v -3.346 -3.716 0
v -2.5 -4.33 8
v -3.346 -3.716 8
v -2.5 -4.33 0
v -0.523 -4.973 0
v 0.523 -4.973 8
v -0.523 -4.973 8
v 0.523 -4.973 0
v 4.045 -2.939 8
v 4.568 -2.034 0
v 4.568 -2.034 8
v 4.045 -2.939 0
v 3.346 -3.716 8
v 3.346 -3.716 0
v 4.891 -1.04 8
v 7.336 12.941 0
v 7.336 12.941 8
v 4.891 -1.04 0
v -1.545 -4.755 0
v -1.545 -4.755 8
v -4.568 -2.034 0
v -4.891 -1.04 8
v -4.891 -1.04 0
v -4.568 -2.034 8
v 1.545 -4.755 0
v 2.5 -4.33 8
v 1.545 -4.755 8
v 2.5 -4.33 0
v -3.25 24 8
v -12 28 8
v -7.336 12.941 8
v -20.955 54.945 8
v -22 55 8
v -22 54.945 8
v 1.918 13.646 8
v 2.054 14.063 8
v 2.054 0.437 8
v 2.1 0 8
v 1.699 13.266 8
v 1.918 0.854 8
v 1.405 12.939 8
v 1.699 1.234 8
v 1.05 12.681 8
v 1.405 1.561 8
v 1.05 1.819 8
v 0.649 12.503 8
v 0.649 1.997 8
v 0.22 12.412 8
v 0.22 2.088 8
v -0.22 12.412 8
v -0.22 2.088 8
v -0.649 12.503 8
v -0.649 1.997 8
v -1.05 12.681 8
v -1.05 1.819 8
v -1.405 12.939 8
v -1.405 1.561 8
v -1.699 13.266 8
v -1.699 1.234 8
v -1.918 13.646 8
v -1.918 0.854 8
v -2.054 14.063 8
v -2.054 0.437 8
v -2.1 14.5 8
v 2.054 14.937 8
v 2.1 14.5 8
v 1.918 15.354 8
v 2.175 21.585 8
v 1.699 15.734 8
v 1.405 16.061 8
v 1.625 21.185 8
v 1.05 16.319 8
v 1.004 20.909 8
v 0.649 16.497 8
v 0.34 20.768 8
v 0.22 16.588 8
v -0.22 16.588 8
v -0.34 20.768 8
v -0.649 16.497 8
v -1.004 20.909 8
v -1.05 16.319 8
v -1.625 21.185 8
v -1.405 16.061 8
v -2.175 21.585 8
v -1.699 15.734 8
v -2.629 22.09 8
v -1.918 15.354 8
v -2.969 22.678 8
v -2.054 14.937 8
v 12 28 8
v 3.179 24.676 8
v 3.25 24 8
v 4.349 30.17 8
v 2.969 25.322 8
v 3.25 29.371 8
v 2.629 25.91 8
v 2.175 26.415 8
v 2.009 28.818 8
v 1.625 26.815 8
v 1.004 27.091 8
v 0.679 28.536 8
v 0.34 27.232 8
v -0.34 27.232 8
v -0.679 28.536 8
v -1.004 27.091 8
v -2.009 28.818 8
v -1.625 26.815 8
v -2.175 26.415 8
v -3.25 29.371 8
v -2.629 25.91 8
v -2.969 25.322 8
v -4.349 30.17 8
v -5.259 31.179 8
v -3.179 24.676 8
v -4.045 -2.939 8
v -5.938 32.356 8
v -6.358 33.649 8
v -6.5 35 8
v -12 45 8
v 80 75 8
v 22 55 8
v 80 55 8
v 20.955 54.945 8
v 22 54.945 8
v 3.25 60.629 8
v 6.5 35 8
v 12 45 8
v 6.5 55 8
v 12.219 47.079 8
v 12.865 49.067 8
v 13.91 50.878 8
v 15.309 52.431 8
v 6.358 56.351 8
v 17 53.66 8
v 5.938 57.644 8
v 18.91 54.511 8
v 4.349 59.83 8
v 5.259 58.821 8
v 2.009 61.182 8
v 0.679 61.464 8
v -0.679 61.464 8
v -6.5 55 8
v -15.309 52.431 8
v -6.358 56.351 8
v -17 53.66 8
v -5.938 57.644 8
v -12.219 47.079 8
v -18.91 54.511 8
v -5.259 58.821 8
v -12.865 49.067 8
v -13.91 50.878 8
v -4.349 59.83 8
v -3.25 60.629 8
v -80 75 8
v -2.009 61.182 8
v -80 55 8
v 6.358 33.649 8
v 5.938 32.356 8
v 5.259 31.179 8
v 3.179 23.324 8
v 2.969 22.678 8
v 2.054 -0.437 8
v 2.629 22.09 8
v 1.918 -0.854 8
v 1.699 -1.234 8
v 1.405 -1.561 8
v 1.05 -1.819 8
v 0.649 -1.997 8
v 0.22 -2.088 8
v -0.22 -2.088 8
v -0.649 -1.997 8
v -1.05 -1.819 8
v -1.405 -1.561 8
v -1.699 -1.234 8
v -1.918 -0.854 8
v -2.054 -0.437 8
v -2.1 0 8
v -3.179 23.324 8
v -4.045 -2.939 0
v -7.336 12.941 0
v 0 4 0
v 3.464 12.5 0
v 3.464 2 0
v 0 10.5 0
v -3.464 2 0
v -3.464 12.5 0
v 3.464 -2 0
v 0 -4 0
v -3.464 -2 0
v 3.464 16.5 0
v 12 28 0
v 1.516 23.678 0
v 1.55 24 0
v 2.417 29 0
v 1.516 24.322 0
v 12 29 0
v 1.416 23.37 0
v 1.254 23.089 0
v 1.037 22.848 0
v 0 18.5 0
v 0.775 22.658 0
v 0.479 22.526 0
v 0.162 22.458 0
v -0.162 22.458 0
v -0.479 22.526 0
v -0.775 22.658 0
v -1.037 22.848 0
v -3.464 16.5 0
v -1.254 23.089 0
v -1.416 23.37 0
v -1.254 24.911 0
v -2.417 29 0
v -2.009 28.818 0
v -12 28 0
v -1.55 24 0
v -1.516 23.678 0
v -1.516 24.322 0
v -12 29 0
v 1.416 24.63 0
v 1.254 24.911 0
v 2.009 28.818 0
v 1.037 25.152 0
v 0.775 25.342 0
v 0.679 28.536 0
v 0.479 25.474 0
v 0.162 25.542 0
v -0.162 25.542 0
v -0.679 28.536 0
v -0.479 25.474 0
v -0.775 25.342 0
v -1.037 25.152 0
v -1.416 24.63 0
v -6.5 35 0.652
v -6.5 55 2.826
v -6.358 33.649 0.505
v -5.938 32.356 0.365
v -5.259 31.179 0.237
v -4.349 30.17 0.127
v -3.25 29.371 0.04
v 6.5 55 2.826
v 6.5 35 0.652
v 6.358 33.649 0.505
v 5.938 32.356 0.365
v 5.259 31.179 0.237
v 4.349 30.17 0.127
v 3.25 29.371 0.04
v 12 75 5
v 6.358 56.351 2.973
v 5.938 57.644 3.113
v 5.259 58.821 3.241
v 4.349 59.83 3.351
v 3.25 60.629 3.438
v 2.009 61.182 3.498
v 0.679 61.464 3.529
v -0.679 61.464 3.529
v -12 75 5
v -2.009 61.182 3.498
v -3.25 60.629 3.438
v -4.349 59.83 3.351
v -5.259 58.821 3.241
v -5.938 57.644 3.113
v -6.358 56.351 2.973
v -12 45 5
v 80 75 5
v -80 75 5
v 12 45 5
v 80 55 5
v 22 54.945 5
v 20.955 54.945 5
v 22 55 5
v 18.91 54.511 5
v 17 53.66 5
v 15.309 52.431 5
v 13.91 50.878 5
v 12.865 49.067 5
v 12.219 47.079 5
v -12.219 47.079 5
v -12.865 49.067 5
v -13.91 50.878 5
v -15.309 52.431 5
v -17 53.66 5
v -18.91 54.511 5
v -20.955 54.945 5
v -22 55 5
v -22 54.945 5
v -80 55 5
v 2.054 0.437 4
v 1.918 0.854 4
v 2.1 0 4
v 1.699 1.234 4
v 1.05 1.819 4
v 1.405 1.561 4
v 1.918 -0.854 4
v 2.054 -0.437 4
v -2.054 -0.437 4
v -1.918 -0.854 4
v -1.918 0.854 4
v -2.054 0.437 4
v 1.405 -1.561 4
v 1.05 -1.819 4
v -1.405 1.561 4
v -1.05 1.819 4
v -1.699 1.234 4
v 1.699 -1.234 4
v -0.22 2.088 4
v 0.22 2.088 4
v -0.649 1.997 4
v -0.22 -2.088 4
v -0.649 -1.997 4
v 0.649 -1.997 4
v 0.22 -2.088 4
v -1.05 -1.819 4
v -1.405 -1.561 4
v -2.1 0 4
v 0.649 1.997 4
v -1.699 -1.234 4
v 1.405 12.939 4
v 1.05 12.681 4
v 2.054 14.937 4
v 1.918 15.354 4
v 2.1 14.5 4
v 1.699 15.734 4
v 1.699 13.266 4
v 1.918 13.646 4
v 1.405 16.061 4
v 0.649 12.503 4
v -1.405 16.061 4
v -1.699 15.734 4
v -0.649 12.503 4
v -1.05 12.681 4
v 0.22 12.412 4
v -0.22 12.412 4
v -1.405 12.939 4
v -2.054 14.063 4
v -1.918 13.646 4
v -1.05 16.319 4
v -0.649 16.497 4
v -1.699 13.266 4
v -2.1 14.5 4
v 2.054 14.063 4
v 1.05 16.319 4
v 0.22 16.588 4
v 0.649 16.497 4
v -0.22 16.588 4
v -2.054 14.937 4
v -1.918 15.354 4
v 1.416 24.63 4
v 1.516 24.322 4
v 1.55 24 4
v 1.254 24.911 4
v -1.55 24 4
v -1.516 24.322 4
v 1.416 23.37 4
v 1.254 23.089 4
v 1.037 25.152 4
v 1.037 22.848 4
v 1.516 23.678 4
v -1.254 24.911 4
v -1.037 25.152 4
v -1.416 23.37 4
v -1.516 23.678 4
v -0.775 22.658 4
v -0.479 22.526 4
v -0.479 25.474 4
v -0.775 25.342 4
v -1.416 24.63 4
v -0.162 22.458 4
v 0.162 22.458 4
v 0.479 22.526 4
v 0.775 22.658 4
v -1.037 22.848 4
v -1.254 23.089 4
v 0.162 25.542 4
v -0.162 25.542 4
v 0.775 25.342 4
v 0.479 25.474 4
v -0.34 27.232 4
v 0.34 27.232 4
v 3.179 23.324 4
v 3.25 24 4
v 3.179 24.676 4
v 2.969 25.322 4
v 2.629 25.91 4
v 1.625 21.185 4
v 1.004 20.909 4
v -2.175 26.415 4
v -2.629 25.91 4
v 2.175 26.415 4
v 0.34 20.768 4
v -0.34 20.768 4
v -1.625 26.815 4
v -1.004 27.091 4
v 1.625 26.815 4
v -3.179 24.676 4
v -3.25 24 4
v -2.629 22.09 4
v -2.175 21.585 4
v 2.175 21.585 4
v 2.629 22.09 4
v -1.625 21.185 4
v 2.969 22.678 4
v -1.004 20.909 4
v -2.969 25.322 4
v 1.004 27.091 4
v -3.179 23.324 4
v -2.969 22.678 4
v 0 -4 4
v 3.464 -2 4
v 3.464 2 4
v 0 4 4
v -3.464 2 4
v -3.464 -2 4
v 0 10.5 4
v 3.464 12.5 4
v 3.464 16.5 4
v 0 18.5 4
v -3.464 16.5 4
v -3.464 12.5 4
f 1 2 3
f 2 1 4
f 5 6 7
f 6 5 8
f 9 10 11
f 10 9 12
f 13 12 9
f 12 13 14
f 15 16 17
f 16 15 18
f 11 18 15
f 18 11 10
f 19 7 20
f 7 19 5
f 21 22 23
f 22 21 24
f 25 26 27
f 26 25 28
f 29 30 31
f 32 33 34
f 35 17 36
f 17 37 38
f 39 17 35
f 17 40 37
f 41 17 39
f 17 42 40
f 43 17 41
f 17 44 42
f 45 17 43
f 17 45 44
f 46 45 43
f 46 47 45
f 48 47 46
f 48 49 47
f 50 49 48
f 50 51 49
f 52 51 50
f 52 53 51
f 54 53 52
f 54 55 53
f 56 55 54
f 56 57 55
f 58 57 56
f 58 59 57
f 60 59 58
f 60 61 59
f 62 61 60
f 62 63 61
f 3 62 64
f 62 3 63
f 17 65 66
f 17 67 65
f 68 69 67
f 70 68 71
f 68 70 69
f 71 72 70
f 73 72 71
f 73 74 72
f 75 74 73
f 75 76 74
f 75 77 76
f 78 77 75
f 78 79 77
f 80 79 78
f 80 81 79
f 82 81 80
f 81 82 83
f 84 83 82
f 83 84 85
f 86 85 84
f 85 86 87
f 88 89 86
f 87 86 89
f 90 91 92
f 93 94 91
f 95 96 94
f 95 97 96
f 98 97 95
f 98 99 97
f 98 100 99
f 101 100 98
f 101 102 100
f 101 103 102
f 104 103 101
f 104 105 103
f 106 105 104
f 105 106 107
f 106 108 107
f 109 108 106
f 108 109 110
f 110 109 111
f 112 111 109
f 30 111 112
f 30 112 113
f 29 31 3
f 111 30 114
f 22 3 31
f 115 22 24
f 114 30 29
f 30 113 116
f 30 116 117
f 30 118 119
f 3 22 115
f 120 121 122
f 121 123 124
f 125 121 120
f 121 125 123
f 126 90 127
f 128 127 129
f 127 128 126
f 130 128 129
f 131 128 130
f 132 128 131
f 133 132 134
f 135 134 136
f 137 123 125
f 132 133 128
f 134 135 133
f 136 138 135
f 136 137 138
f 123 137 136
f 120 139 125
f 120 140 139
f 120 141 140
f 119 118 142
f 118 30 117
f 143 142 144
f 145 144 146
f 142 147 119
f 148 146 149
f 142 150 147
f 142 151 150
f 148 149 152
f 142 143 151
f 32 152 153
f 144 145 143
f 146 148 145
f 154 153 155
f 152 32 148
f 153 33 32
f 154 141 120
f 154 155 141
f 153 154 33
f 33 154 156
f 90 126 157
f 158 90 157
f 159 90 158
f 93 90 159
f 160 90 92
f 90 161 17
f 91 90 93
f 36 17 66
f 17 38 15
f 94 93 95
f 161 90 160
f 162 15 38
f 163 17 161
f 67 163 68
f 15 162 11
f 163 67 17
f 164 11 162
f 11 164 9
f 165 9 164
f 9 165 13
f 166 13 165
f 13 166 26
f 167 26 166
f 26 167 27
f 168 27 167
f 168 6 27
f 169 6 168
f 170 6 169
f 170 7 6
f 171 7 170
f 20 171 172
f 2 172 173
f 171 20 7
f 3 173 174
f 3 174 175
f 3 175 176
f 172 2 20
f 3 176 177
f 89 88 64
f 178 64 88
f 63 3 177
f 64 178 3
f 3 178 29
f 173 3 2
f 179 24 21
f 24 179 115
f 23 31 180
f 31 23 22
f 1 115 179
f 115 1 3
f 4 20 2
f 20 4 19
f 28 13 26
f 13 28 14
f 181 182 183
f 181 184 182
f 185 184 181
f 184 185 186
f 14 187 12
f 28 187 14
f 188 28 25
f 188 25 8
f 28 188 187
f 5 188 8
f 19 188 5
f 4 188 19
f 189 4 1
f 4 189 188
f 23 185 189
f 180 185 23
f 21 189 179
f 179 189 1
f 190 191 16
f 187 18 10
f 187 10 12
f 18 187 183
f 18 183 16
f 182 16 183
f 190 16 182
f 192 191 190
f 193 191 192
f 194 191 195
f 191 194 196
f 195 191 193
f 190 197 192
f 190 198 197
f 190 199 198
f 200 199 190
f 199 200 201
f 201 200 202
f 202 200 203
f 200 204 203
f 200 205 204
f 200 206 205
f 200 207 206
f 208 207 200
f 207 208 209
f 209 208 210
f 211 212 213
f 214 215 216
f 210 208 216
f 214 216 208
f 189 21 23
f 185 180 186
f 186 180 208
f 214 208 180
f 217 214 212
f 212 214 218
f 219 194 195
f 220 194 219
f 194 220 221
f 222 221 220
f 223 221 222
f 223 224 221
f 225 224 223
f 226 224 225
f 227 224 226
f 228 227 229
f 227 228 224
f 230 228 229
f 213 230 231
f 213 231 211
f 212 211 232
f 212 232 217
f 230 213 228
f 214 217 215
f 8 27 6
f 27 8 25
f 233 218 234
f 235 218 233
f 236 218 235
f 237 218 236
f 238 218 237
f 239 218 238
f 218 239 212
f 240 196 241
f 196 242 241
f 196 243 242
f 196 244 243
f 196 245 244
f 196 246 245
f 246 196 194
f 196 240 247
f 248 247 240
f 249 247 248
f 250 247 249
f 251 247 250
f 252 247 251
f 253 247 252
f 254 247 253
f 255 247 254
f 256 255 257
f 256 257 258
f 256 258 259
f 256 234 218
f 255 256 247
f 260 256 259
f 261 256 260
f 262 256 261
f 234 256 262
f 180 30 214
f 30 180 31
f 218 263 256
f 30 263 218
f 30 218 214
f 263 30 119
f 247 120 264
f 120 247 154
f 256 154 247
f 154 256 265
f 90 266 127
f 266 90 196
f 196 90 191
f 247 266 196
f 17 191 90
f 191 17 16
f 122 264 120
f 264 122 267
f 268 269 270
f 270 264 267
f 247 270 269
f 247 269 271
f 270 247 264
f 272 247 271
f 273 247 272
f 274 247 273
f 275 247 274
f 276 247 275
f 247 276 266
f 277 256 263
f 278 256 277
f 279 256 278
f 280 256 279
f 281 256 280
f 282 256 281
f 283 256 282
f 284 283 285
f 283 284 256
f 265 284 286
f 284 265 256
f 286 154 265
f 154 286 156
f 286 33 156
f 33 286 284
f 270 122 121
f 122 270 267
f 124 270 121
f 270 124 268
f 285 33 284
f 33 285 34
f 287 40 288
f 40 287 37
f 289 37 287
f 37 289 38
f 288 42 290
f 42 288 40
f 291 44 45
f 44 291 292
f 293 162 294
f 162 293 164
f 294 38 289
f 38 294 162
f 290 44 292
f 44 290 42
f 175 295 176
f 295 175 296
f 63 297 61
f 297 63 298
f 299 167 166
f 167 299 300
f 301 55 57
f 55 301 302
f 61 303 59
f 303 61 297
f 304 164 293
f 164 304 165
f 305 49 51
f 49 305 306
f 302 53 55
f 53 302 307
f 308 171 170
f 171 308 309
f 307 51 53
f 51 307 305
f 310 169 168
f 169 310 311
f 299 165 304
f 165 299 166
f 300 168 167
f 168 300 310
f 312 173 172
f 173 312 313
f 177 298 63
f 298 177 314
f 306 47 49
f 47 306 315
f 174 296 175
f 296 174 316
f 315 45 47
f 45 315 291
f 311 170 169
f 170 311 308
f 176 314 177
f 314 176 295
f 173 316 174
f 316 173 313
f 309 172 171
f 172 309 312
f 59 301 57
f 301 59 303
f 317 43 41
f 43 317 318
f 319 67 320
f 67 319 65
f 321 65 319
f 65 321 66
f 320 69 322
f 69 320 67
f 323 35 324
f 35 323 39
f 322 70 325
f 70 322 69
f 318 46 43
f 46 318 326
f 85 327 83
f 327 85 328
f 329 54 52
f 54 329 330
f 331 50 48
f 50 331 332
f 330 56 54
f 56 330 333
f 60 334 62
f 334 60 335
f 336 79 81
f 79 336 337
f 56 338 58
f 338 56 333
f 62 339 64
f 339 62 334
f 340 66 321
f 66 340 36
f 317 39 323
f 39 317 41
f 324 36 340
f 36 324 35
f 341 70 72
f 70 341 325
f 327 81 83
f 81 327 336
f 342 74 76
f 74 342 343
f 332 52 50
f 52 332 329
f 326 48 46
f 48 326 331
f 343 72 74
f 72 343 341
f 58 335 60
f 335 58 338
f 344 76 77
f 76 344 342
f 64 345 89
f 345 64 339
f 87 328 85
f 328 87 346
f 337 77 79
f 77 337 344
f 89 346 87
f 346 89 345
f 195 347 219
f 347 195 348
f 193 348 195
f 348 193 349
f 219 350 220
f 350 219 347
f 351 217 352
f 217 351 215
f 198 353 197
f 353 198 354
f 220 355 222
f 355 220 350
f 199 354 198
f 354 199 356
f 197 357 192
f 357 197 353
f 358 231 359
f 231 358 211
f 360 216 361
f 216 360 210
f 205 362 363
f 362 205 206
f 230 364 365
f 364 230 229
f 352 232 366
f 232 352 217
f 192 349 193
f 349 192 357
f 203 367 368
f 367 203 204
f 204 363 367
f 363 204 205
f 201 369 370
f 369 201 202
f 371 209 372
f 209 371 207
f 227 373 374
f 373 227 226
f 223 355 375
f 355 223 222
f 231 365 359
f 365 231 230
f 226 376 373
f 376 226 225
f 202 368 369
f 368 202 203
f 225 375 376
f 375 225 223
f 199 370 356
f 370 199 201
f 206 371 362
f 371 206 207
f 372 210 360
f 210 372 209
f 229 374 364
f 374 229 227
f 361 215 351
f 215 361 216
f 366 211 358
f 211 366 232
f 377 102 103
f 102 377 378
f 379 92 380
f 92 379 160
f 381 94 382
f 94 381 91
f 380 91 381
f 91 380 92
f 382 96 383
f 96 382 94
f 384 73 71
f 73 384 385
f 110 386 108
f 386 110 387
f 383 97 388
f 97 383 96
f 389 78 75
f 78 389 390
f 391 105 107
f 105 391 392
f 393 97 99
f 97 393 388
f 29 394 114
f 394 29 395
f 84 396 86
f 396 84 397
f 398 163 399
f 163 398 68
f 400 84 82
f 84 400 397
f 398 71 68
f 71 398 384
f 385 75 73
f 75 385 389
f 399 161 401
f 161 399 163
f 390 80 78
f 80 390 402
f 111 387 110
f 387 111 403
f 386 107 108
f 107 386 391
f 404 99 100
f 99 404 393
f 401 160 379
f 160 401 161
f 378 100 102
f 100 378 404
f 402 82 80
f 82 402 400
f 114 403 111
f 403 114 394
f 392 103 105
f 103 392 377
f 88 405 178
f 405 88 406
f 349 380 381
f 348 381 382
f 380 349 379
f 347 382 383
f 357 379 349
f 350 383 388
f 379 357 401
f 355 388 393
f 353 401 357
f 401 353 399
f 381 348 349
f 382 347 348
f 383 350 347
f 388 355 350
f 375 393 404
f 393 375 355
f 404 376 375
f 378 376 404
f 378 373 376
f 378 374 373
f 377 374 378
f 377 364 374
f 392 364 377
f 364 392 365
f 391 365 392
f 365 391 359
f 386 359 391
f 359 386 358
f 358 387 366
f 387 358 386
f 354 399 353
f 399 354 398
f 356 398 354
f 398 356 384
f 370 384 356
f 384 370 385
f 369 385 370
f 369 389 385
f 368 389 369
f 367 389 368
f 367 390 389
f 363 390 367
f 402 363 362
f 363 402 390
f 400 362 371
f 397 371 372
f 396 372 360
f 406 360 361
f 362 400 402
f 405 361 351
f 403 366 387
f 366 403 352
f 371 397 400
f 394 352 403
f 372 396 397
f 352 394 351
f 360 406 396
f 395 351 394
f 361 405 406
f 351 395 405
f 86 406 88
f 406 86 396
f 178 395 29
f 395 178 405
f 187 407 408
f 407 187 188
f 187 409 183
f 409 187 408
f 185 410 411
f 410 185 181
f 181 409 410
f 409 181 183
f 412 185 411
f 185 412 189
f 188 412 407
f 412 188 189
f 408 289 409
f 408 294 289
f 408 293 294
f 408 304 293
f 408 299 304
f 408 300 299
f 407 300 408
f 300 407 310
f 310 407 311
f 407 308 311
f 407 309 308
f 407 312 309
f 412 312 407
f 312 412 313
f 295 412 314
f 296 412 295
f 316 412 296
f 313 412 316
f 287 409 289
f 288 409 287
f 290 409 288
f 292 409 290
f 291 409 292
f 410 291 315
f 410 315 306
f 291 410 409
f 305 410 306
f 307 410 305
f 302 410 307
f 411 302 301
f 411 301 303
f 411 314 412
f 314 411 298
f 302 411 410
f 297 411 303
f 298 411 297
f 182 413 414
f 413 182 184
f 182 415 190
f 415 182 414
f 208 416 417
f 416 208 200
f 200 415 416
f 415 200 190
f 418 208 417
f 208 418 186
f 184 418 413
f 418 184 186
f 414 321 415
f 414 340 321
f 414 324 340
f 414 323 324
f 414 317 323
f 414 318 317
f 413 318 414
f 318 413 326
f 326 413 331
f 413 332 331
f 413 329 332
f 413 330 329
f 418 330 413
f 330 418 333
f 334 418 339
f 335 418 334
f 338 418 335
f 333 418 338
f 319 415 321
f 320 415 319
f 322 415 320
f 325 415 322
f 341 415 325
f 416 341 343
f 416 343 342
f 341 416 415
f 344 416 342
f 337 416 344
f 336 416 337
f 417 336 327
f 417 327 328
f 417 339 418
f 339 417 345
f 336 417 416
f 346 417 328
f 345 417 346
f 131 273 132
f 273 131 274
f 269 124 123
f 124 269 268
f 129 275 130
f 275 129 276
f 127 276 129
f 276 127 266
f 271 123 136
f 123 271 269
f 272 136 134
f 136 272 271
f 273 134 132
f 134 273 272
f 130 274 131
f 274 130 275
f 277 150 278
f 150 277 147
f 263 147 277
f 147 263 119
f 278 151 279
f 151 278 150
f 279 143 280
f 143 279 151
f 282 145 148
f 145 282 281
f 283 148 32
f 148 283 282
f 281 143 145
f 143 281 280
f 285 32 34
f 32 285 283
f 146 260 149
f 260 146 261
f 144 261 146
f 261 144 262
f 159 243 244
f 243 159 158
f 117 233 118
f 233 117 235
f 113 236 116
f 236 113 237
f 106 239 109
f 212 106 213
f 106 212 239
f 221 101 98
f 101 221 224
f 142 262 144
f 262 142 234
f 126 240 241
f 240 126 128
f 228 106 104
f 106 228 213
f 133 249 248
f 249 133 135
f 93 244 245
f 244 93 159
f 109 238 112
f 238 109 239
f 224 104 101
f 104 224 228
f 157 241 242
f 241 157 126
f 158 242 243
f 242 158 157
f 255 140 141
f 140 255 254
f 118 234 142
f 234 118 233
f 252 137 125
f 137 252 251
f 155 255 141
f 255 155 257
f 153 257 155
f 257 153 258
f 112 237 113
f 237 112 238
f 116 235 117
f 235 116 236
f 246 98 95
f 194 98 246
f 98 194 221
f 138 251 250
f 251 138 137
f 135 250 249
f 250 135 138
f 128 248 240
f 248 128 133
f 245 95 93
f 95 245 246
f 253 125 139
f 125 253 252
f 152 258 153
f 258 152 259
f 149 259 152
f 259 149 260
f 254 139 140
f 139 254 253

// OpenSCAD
// Wing adapter with body post

$fs = 0.1;
yd = 10;
m4_d = 4.2;
m3_d = 3.1;
s_dist = 14.5;
post_dist = 24;
lip_dist = 28;
hh = 8;
mount_dist = 54;

xx = 24;

m_x1 = 14.8;
m_x2 = 7.9;
m_y = 32;
m_z1 = 2.5;
m_z2 = 2.5;

bredd = 160;
tjock = 3;

curv = 10;

frontwingflex_p();


module frontwing_p() {
    difference() {
        union() {
            difference() {
                union() {
                    hull() {
                        translate([0,0,0]) cylinder(d = yd, h=hh);
                        translate([0,s_dist,0]) cylinder(d = yd+5, h=hh);
                        translate([0,post_dist,0]) cylinder(d = yd, h=hh);
                    }
                    hull() {
                        translate([0,s_dist,0]) cylinder(d = yd+5, h=hh);
                        translate([-xx/2,lip_dist,0]) cube([xx, 1, hh]);
                        translate([-xx/2,55+20-1,hh-tjock]) cube([xx, 1, tjock]);
                    }
                    //translate([-xx/2,lip_dist,0]) cube([xx, 6, hh+2.5]);
                    translate([-bredd/2,55,hh-tjock]) cube([bredd, 20, tjock]); // fetplattan
                    translate([-xx/2,55-curv,hh-tjock]) cube([xx+curv, 30, tjock]); //curvplatta
                    translate([-xx/2-curv,55-curv,hh-tjock]) cube([xx, 30, tjock]); //curvplatta
                    
                }
                //translate([-50/2,mount_dist-m_y/2,0]) cube([50, m_y, 100]);
            }
            //translate([-m_x1/2,mount_dist-m_y/2,0]) cube([m_x1, m_y, m_z1]);
            //translate([-m_x2/2,mount_dist-m_y/2,m_z1]) cube([m_x2, m_y, m_z2]);
        }
        // screw holes
        translate([0,0,0])      cylinder(d = m4_d, h=hh);
        translate([0,s_dist,0]) cylinder(d = m4_d, h=hh);
        translate([0,post_dist,0]) cylinder(d = m3_d, h=hh);
        translate([0,mount_dist,0])  cylinder(d = m3_d, h=hh+m_z1+m_z2);
        
        translate([0,post_dist,4]) cylinder(d = 6.5, h=hh);
        
        //muttrar
        translate([0,mount_dist,0])  cylinder(d=6.5, h=2.5, $fn=6);
        
        translate([0,0,0]) rotate([0,0,360/12]) cylinder(d=8, h=4, $fn=6);
        translate([0,s_dist,0]) rotate([0,0,360/12]) cylinder(d=8, h=4, $fn=6);
        
        // curv
        translate([xx/2+curv, 55-curv,hh-tjock ]) cylinder(r=curv, h=tjock);
        translate([-xx/2-curv, 55-curv,hh-tjock ]) cylinder(r=curv, h=tjock);
    }
}

module frontwingflex_p() {
    difference() {
        frontwing_p();
        hull() {
            translate([0,55,0]) cylinder(d=13, h=10);
            translate([0,35,0]) cylinder(d=13, h=10);
        }
    }
}
